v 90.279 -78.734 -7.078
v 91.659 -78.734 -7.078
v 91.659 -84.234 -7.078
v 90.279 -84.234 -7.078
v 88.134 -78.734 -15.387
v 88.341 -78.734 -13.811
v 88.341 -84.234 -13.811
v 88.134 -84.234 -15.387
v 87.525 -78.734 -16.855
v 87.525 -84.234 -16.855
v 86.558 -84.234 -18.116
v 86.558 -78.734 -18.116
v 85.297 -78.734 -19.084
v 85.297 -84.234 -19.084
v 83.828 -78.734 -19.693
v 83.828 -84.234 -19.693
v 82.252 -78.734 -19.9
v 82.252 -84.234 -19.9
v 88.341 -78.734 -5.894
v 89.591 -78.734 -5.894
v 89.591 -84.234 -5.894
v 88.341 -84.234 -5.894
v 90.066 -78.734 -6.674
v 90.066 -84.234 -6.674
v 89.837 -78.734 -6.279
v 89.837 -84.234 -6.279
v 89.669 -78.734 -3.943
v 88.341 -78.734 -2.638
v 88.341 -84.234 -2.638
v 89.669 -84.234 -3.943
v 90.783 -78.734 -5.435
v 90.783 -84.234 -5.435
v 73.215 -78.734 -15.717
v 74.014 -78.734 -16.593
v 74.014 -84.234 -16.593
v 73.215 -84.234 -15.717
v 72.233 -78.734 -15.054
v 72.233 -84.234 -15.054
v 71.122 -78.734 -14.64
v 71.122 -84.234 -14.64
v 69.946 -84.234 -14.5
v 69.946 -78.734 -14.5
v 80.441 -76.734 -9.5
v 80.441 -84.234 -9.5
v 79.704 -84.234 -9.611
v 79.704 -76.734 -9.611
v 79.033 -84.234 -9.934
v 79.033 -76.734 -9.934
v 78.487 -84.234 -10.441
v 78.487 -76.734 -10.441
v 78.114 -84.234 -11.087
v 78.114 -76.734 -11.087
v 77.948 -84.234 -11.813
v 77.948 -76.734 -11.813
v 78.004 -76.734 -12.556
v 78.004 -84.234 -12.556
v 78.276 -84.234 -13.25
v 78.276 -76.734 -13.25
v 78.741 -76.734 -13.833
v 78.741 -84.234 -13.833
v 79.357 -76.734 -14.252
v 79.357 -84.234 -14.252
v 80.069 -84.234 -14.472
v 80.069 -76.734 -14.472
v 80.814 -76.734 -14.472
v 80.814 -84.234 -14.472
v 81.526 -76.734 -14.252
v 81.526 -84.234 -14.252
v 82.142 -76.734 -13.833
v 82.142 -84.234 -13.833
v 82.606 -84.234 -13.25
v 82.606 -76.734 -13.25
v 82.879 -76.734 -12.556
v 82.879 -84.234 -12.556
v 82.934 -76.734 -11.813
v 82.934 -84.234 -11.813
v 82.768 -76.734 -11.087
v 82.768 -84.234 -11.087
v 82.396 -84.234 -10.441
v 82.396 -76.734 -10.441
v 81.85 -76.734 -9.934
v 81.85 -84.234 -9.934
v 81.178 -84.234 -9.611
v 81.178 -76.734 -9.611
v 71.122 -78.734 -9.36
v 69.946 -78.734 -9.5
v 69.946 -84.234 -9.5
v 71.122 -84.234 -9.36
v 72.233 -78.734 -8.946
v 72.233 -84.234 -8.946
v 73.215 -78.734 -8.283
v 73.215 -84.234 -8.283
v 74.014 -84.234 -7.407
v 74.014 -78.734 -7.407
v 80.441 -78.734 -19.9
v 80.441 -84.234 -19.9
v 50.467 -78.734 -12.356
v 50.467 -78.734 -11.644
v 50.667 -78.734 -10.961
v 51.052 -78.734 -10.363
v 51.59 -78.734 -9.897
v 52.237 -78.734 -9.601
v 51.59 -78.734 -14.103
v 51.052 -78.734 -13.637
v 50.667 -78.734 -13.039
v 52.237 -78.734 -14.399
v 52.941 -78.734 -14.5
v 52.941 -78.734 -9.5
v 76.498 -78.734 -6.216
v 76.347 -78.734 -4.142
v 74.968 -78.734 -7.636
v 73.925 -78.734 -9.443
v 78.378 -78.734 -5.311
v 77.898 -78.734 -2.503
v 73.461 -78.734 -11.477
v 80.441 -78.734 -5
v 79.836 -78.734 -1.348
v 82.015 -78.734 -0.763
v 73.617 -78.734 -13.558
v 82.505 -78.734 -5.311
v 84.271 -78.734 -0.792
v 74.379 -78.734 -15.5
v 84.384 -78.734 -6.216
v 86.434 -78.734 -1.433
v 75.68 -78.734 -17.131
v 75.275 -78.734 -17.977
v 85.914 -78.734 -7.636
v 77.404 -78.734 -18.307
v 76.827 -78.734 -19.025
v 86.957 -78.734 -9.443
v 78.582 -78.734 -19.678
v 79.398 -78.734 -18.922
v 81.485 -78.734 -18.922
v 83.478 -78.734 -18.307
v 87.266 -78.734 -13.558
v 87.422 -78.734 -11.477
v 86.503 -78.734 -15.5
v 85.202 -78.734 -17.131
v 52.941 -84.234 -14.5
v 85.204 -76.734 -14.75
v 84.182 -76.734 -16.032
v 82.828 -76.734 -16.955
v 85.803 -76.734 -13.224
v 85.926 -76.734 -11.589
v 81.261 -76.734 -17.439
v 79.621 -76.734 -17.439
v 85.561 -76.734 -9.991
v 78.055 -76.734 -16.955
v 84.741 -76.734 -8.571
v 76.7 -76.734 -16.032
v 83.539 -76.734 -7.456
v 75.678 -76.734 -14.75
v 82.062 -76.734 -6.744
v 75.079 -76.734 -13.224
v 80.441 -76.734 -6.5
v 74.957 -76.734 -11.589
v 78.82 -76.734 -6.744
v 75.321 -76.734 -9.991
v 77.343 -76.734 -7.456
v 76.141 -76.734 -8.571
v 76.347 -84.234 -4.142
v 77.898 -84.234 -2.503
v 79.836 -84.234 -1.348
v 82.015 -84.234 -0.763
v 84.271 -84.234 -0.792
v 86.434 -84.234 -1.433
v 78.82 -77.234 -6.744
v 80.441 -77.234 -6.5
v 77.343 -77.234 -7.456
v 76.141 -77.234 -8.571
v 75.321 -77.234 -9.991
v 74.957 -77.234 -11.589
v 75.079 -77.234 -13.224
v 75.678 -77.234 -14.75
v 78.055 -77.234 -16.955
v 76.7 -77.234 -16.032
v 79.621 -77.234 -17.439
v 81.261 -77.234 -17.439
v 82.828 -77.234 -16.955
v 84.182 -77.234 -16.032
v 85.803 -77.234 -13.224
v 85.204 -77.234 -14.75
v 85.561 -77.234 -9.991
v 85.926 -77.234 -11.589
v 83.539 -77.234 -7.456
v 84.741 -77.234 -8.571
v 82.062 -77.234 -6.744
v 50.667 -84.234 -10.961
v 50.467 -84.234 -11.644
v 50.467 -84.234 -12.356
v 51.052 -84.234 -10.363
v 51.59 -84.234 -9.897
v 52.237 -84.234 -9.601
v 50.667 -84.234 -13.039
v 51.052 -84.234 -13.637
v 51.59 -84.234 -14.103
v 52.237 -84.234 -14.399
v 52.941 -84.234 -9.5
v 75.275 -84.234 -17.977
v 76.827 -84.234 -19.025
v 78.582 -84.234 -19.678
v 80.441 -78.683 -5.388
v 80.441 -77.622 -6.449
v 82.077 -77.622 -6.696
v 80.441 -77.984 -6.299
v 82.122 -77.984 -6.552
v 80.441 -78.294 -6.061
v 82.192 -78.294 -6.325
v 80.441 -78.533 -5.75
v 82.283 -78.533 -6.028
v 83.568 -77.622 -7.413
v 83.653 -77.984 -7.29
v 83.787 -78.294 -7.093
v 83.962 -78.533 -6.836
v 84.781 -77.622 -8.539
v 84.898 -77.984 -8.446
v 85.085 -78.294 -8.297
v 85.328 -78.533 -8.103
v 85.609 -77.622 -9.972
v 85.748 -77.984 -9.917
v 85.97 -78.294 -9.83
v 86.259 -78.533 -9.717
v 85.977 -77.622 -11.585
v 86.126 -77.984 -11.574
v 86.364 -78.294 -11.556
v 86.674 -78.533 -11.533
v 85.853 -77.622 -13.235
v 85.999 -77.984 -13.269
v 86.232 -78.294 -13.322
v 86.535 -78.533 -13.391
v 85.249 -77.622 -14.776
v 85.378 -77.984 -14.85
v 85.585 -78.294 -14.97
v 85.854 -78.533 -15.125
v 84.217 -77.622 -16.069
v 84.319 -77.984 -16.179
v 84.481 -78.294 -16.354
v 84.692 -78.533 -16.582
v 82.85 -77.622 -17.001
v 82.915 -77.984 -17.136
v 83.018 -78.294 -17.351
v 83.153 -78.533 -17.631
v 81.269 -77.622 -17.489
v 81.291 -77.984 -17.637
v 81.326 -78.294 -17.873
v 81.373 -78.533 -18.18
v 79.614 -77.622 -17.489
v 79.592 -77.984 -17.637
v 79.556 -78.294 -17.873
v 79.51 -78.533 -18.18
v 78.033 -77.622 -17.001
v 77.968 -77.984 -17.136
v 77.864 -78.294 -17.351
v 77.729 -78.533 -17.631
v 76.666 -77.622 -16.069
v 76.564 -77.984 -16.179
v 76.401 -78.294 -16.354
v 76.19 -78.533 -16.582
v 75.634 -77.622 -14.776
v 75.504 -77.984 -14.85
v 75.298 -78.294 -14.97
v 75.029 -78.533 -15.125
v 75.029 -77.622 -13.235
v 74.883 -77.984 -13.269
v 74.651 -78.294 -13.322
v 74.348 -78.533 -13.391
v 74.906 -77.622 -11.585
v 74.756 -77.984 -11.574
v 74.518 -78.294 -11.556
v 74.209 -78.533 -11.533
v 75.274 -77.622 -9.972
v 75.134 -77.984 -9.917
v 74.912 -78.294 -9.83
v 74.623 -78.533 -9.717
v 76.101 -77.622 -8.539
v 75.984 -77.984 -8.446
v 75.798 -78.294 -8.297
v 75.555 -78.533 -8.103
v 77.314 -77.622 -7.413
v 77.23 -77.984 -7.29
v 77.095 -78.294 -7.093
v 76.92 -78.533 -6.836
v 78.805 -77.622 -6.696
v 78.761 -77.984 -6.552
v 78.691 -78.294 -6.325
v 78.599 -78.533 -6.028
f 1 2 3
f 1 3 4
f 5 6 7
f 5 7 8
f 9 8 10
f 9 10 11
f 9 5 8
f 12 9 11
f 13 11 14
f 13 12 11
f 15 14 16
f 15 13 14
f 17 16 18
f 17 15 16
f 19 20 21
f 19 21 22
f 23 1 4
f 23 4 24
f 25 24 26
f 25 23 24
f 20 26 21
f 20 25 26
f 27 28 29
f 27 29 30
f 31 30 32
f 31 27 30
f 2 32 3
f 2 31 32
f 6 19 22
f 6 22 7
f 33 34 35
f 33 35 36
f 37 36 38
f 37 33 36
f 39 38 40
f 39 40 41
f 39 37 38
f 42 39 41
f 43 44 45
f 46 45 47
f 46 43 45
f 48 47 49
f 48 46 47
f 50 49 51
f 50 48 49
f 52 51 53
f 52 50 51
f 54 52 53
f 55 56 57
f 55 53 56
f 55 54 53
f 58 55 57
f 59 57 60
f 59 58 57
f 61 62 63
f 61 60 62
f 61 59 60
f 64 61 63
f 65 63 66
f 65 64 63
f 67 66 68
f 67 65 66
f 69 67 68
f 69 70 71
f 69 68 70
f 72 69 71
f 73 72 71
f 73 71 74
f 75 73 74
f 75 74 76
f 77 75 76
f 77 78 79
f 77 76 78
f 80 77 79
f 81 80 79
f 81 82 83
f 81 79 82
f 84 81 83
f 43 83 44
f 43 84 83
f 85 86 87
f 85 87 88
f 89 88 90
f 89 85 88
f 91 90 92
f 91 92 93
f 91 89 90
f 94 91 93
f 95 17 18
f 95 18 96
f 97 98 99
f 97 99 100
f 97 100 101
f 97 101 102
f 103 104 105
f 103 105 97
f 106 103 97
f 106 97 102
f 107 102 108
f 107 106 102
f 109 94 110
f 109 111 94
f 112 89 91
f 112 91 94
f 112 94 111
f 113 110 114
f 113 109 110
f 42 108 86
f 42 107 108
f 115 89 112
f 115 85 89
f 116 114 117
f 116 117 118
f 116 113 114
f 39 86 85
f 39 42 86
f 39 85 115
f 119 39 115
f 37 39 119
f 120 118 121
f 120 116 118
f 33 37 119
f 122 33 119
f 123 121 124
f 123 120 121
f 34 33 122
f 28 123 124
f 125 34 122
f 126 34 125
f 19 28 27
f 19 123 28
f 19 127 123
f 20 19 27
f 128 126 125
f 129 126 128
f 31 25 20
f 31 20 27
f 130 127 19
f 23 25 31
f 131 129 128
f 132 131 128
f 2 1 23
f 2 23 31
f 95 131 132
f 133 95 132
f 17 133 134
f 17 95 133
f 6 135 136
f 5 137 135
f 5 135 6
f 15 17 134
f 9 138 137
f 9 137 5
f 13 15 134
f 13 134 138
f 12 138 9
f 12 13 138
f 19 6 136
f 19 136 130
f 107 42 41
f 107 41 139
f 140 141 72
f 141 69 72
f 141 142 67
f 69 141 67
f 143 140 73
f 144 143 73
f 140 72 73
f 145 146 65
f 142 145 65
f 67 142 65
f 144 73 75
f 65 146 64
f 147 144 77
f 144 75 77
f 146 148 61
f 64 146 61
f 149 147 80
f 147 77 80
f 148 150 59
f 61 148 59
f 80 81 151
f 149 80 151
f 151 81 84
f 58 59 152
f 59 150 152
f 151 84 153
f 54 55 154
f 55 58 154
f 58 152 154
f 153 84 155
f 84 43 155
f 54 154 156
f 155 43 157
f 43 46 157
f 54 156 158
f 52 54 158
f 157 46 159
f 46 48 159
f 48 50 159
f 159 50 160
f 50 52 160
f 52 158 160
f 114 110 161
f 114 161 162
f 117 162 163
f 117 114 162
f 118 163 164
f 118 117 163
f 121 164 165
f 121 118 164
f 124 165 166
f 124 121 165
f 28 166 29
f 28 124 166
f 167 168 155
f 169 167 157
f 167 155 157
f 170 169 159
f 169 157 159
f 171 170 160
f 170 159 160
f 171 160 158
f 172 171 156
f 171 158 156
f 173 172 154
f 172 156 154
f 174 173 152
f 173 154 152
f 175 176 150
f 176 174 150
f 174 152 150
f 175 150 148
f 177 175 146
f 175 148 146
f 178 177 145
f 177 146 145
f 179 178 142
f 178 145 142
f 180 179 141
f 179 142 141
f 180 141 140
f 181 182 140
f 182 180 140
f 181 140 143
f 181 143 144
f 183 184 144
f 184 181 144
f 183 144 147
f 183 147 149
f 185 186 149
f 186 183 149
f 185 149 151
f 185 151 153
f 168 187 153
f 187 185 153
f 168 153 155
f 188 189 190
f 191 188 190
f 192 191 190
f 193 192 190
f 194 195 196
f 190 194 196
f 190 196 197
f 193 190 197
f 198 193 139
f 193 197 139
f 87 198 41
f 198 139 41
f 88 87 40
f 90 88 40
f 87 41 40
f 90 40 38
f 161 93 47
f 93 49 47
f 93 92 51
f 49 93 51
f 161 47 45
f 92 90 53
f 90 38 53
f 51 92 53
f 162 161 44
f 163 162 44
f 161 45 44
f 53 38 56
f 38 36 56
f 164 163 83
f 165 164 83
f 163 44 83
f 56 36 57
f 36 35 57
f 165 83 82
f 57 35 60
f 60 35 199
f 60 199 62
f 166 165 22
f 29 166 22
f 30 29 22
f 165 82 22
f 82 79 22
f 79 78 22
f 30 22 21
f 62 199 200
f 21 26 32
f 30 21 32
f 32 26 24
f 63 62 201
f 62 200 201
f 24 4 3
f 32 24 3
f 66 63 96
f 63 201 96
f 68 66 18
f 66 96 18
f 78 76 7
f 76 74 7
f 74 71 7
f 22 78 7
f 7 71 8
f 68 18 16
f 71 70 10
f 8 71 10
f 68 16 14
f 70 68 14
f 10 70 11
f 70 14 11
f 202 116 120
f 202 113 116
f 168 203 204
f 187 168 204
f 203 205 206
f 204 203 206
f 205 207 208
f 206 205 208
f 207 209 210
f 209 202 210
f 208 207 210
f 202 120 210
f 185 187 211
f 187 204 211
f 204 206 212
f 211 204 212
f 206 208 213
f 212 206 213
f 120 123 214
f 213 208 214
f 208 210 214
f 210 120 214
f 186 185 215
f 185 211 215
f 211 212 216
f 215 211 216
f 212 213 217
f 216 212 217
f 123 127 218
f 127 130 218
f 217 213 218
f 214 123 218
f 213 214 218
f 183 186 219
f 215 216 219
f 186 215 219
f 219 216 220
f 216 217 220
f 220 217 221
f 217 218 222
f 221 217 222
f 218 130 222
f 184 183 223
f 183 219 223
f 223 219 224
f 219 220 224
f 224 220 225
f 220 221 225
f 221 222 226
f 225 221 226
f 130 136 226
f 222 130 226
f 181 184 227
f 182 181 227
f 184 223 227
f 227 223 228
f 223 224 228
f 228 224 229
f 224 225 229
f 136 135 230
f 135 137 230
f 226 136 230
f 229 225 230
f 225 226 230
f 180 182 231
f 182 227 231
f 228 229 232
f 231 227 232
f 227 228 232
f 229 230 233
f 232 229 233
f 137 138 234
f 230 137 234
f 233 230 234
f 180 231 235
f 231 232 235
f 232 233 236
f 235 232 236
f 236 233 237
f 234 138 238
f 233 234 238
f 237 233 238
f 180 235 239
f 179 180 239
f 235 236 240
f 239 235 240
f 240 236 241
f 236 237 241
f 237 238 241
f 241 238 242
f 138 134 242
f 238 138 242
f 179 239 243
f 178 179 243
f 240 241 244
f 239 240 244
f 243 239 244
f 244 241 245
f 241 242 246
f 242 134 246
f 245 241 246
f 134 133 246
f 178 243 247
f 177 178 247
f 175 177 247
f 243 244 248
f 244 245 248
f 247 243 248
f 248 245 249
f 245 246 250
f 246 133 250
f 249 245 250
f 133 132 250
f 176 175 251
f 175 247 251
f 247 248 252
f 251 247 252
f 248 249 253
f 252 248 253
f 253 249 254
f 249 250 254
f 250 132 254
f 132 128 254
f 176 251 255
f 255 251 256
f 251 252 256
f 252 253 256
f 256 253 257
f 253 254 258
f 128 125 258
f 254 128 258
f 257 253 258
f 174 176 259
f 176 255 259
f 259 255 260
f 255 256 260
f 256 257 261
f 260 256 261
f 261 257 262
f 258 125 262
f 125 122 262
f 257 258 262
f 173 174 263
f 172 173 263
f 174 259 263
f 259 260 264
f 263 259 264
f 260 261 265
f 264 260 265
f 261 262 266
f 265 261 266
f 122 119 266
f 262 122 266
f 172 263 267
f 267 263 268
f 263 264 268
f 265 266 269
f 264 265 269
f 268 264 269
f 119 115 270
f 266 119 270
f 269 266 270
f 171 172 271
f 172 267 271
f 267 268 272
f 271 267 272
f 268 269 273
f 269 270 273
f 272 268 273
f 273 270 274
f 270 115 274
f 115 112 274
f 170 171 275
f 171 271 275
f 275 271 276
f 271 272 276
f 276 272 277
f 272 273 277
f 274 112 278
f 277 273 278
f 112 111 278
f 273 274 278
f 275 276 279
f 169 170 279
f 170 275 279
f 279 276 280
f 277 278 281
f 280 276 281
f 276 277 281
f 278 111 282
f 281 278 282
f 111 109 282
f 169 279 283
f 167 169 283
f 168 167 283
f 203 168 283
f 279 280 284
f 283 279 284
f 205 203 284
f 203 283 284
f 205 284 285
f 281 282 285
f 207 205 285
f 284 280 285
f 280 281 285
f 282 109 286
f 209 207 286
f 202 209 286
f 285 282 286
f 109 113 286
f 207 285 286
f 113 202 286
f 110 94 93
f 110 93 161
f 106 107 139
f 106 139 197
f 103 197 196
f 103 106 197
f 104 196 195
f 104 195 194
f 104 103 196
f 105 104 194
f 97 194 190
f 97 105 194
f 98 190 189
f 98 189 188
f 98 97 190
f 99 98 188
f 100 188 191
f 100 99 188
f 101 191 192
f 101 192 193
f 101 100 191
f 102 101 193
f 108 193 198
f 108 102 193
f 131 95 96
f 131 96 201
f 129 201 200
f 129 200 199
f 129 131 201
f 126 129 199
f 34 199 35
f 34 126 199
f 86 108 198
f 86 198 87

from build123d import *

# Parameters (mm, degrees)
BOSS_EXTRUDE1_START = -2
SKETCH1_R           = 2.5
BOSS_EXTRUDE1_DEPTH = 5.5
BOSS_EXTRUDE2_REACH = 96.094
SKETCH2_R           = 5.5
SKETCH2_R_2         = 2.5
FILLET1_R           = 1.5


with BuildPart() as part:
    # Sketch1 → Boss-Extrude1 (new body)
    with BuildSketch(Plane(origin=(0, -76.733621845, 0), x_dir=(1, 0, 0), z_dir=(0, 1, 0)).offset(BOSS_EXTRUDE1_START)):
        with BuildLine():
            Line((52.941217068, 9.5), (69.945503657, 9.5))
            ThreePointArc((69.945503657, 9.5), (72.232982212, 8.946059138), (74.01360963, 7.406976744))
            Line((74.01360963, 7.406976744), (76.346988808, 4.141579527))
            ThreePointArc((76.346988808, 4.141579527), (82.014772389, 0.763045112), (88.341217068, 2.637708614))
            ThreePointArc((88.341217068, 2.637708614), (90.254455743, 4.667684765), (91.658842367, 7.07786808))
            Line((91.658842367, 7.07786808), (90.278524492, 7.07786808))
            ThreePointArc((90.278524492, 7.07786808), (89.953291089, 6.475468544), (89.591215146, 5.89446684))
            Line((89.591215146, 5.89446684), (88.341217068, 5.89446684))
            Line((88.341217068, 5.89446684), (88.341217068, 12))
            Line((88.341217068, 12), (88.341217068, 13.810660172))
            ThreePointArc((88.341217068, 13.810660172), (86.557690725, 18.116473657), (82.25187724, 19.9))
            Line((82.25187724, 19.9), (80.441217068, 19.9))
            ThreePointArc((80.441217068, 19.9), (76.827000951, 19.024773438), (74.01360963, 16.593023256))
            ThreePointArc((74.01360963, 16.593023256), (72.232982212, 15.053940862), (69.945503657, 14.5))
            Line((69.945503657, 14.5), (52.941217068, 14.5))
            ThreePointArc((52.941217068, 14.5), (50.441217068, 12), (52.941217068, 9.5))
        make_face()
        with Locations(Location((80.441217068, 12, 0), (0, 0, 270))):
            Circle(SKETCH1_R, mode=Mode.SUBTRACT)
    extrude(amount=-BOSS_EXTRUDE1_DEPTH)

    # Sketch2 → Boss-Extrude2 (add, up to next)
    with BuildSketch(Plane(origin=(0, -76.733621845, 0), x_dir=(-1, 0, 0), z_dir=(0, -1, 0)), mode=Mode.PRIVATE) as boss_extrude2_sk1:
        with Locations(Location((-80.441217068, 12, 0), (0, 0, 270))):
            Circle(SKETCH2_R)
        with Locations(Location((-80.441217068, 12, 0), (0, 0, 270))):
            Circle(SKETCH2_R_2, mode=Mode.SUBTRACT)
    boss_extrude2_tool1 = extrude(boss_extrude2_sk1.sketch, amount=BOSS_EXTRUDE2_REACH, mode=Mode.PRIVATE) - part.part
    add(boss_extrude2_tool1.solids().sort_by_distance((80.441217, -76.733622, -17.344437))[0])

    # Fillet1
    fillet1_edges = [part.edges().sort_by_distance(p)[0] for p in [
        (80.441217068, -78.733621845, -17.5),
    ]]
    fillet(fillet1_edges, radius=FILLET1_R)


solid = part.part
